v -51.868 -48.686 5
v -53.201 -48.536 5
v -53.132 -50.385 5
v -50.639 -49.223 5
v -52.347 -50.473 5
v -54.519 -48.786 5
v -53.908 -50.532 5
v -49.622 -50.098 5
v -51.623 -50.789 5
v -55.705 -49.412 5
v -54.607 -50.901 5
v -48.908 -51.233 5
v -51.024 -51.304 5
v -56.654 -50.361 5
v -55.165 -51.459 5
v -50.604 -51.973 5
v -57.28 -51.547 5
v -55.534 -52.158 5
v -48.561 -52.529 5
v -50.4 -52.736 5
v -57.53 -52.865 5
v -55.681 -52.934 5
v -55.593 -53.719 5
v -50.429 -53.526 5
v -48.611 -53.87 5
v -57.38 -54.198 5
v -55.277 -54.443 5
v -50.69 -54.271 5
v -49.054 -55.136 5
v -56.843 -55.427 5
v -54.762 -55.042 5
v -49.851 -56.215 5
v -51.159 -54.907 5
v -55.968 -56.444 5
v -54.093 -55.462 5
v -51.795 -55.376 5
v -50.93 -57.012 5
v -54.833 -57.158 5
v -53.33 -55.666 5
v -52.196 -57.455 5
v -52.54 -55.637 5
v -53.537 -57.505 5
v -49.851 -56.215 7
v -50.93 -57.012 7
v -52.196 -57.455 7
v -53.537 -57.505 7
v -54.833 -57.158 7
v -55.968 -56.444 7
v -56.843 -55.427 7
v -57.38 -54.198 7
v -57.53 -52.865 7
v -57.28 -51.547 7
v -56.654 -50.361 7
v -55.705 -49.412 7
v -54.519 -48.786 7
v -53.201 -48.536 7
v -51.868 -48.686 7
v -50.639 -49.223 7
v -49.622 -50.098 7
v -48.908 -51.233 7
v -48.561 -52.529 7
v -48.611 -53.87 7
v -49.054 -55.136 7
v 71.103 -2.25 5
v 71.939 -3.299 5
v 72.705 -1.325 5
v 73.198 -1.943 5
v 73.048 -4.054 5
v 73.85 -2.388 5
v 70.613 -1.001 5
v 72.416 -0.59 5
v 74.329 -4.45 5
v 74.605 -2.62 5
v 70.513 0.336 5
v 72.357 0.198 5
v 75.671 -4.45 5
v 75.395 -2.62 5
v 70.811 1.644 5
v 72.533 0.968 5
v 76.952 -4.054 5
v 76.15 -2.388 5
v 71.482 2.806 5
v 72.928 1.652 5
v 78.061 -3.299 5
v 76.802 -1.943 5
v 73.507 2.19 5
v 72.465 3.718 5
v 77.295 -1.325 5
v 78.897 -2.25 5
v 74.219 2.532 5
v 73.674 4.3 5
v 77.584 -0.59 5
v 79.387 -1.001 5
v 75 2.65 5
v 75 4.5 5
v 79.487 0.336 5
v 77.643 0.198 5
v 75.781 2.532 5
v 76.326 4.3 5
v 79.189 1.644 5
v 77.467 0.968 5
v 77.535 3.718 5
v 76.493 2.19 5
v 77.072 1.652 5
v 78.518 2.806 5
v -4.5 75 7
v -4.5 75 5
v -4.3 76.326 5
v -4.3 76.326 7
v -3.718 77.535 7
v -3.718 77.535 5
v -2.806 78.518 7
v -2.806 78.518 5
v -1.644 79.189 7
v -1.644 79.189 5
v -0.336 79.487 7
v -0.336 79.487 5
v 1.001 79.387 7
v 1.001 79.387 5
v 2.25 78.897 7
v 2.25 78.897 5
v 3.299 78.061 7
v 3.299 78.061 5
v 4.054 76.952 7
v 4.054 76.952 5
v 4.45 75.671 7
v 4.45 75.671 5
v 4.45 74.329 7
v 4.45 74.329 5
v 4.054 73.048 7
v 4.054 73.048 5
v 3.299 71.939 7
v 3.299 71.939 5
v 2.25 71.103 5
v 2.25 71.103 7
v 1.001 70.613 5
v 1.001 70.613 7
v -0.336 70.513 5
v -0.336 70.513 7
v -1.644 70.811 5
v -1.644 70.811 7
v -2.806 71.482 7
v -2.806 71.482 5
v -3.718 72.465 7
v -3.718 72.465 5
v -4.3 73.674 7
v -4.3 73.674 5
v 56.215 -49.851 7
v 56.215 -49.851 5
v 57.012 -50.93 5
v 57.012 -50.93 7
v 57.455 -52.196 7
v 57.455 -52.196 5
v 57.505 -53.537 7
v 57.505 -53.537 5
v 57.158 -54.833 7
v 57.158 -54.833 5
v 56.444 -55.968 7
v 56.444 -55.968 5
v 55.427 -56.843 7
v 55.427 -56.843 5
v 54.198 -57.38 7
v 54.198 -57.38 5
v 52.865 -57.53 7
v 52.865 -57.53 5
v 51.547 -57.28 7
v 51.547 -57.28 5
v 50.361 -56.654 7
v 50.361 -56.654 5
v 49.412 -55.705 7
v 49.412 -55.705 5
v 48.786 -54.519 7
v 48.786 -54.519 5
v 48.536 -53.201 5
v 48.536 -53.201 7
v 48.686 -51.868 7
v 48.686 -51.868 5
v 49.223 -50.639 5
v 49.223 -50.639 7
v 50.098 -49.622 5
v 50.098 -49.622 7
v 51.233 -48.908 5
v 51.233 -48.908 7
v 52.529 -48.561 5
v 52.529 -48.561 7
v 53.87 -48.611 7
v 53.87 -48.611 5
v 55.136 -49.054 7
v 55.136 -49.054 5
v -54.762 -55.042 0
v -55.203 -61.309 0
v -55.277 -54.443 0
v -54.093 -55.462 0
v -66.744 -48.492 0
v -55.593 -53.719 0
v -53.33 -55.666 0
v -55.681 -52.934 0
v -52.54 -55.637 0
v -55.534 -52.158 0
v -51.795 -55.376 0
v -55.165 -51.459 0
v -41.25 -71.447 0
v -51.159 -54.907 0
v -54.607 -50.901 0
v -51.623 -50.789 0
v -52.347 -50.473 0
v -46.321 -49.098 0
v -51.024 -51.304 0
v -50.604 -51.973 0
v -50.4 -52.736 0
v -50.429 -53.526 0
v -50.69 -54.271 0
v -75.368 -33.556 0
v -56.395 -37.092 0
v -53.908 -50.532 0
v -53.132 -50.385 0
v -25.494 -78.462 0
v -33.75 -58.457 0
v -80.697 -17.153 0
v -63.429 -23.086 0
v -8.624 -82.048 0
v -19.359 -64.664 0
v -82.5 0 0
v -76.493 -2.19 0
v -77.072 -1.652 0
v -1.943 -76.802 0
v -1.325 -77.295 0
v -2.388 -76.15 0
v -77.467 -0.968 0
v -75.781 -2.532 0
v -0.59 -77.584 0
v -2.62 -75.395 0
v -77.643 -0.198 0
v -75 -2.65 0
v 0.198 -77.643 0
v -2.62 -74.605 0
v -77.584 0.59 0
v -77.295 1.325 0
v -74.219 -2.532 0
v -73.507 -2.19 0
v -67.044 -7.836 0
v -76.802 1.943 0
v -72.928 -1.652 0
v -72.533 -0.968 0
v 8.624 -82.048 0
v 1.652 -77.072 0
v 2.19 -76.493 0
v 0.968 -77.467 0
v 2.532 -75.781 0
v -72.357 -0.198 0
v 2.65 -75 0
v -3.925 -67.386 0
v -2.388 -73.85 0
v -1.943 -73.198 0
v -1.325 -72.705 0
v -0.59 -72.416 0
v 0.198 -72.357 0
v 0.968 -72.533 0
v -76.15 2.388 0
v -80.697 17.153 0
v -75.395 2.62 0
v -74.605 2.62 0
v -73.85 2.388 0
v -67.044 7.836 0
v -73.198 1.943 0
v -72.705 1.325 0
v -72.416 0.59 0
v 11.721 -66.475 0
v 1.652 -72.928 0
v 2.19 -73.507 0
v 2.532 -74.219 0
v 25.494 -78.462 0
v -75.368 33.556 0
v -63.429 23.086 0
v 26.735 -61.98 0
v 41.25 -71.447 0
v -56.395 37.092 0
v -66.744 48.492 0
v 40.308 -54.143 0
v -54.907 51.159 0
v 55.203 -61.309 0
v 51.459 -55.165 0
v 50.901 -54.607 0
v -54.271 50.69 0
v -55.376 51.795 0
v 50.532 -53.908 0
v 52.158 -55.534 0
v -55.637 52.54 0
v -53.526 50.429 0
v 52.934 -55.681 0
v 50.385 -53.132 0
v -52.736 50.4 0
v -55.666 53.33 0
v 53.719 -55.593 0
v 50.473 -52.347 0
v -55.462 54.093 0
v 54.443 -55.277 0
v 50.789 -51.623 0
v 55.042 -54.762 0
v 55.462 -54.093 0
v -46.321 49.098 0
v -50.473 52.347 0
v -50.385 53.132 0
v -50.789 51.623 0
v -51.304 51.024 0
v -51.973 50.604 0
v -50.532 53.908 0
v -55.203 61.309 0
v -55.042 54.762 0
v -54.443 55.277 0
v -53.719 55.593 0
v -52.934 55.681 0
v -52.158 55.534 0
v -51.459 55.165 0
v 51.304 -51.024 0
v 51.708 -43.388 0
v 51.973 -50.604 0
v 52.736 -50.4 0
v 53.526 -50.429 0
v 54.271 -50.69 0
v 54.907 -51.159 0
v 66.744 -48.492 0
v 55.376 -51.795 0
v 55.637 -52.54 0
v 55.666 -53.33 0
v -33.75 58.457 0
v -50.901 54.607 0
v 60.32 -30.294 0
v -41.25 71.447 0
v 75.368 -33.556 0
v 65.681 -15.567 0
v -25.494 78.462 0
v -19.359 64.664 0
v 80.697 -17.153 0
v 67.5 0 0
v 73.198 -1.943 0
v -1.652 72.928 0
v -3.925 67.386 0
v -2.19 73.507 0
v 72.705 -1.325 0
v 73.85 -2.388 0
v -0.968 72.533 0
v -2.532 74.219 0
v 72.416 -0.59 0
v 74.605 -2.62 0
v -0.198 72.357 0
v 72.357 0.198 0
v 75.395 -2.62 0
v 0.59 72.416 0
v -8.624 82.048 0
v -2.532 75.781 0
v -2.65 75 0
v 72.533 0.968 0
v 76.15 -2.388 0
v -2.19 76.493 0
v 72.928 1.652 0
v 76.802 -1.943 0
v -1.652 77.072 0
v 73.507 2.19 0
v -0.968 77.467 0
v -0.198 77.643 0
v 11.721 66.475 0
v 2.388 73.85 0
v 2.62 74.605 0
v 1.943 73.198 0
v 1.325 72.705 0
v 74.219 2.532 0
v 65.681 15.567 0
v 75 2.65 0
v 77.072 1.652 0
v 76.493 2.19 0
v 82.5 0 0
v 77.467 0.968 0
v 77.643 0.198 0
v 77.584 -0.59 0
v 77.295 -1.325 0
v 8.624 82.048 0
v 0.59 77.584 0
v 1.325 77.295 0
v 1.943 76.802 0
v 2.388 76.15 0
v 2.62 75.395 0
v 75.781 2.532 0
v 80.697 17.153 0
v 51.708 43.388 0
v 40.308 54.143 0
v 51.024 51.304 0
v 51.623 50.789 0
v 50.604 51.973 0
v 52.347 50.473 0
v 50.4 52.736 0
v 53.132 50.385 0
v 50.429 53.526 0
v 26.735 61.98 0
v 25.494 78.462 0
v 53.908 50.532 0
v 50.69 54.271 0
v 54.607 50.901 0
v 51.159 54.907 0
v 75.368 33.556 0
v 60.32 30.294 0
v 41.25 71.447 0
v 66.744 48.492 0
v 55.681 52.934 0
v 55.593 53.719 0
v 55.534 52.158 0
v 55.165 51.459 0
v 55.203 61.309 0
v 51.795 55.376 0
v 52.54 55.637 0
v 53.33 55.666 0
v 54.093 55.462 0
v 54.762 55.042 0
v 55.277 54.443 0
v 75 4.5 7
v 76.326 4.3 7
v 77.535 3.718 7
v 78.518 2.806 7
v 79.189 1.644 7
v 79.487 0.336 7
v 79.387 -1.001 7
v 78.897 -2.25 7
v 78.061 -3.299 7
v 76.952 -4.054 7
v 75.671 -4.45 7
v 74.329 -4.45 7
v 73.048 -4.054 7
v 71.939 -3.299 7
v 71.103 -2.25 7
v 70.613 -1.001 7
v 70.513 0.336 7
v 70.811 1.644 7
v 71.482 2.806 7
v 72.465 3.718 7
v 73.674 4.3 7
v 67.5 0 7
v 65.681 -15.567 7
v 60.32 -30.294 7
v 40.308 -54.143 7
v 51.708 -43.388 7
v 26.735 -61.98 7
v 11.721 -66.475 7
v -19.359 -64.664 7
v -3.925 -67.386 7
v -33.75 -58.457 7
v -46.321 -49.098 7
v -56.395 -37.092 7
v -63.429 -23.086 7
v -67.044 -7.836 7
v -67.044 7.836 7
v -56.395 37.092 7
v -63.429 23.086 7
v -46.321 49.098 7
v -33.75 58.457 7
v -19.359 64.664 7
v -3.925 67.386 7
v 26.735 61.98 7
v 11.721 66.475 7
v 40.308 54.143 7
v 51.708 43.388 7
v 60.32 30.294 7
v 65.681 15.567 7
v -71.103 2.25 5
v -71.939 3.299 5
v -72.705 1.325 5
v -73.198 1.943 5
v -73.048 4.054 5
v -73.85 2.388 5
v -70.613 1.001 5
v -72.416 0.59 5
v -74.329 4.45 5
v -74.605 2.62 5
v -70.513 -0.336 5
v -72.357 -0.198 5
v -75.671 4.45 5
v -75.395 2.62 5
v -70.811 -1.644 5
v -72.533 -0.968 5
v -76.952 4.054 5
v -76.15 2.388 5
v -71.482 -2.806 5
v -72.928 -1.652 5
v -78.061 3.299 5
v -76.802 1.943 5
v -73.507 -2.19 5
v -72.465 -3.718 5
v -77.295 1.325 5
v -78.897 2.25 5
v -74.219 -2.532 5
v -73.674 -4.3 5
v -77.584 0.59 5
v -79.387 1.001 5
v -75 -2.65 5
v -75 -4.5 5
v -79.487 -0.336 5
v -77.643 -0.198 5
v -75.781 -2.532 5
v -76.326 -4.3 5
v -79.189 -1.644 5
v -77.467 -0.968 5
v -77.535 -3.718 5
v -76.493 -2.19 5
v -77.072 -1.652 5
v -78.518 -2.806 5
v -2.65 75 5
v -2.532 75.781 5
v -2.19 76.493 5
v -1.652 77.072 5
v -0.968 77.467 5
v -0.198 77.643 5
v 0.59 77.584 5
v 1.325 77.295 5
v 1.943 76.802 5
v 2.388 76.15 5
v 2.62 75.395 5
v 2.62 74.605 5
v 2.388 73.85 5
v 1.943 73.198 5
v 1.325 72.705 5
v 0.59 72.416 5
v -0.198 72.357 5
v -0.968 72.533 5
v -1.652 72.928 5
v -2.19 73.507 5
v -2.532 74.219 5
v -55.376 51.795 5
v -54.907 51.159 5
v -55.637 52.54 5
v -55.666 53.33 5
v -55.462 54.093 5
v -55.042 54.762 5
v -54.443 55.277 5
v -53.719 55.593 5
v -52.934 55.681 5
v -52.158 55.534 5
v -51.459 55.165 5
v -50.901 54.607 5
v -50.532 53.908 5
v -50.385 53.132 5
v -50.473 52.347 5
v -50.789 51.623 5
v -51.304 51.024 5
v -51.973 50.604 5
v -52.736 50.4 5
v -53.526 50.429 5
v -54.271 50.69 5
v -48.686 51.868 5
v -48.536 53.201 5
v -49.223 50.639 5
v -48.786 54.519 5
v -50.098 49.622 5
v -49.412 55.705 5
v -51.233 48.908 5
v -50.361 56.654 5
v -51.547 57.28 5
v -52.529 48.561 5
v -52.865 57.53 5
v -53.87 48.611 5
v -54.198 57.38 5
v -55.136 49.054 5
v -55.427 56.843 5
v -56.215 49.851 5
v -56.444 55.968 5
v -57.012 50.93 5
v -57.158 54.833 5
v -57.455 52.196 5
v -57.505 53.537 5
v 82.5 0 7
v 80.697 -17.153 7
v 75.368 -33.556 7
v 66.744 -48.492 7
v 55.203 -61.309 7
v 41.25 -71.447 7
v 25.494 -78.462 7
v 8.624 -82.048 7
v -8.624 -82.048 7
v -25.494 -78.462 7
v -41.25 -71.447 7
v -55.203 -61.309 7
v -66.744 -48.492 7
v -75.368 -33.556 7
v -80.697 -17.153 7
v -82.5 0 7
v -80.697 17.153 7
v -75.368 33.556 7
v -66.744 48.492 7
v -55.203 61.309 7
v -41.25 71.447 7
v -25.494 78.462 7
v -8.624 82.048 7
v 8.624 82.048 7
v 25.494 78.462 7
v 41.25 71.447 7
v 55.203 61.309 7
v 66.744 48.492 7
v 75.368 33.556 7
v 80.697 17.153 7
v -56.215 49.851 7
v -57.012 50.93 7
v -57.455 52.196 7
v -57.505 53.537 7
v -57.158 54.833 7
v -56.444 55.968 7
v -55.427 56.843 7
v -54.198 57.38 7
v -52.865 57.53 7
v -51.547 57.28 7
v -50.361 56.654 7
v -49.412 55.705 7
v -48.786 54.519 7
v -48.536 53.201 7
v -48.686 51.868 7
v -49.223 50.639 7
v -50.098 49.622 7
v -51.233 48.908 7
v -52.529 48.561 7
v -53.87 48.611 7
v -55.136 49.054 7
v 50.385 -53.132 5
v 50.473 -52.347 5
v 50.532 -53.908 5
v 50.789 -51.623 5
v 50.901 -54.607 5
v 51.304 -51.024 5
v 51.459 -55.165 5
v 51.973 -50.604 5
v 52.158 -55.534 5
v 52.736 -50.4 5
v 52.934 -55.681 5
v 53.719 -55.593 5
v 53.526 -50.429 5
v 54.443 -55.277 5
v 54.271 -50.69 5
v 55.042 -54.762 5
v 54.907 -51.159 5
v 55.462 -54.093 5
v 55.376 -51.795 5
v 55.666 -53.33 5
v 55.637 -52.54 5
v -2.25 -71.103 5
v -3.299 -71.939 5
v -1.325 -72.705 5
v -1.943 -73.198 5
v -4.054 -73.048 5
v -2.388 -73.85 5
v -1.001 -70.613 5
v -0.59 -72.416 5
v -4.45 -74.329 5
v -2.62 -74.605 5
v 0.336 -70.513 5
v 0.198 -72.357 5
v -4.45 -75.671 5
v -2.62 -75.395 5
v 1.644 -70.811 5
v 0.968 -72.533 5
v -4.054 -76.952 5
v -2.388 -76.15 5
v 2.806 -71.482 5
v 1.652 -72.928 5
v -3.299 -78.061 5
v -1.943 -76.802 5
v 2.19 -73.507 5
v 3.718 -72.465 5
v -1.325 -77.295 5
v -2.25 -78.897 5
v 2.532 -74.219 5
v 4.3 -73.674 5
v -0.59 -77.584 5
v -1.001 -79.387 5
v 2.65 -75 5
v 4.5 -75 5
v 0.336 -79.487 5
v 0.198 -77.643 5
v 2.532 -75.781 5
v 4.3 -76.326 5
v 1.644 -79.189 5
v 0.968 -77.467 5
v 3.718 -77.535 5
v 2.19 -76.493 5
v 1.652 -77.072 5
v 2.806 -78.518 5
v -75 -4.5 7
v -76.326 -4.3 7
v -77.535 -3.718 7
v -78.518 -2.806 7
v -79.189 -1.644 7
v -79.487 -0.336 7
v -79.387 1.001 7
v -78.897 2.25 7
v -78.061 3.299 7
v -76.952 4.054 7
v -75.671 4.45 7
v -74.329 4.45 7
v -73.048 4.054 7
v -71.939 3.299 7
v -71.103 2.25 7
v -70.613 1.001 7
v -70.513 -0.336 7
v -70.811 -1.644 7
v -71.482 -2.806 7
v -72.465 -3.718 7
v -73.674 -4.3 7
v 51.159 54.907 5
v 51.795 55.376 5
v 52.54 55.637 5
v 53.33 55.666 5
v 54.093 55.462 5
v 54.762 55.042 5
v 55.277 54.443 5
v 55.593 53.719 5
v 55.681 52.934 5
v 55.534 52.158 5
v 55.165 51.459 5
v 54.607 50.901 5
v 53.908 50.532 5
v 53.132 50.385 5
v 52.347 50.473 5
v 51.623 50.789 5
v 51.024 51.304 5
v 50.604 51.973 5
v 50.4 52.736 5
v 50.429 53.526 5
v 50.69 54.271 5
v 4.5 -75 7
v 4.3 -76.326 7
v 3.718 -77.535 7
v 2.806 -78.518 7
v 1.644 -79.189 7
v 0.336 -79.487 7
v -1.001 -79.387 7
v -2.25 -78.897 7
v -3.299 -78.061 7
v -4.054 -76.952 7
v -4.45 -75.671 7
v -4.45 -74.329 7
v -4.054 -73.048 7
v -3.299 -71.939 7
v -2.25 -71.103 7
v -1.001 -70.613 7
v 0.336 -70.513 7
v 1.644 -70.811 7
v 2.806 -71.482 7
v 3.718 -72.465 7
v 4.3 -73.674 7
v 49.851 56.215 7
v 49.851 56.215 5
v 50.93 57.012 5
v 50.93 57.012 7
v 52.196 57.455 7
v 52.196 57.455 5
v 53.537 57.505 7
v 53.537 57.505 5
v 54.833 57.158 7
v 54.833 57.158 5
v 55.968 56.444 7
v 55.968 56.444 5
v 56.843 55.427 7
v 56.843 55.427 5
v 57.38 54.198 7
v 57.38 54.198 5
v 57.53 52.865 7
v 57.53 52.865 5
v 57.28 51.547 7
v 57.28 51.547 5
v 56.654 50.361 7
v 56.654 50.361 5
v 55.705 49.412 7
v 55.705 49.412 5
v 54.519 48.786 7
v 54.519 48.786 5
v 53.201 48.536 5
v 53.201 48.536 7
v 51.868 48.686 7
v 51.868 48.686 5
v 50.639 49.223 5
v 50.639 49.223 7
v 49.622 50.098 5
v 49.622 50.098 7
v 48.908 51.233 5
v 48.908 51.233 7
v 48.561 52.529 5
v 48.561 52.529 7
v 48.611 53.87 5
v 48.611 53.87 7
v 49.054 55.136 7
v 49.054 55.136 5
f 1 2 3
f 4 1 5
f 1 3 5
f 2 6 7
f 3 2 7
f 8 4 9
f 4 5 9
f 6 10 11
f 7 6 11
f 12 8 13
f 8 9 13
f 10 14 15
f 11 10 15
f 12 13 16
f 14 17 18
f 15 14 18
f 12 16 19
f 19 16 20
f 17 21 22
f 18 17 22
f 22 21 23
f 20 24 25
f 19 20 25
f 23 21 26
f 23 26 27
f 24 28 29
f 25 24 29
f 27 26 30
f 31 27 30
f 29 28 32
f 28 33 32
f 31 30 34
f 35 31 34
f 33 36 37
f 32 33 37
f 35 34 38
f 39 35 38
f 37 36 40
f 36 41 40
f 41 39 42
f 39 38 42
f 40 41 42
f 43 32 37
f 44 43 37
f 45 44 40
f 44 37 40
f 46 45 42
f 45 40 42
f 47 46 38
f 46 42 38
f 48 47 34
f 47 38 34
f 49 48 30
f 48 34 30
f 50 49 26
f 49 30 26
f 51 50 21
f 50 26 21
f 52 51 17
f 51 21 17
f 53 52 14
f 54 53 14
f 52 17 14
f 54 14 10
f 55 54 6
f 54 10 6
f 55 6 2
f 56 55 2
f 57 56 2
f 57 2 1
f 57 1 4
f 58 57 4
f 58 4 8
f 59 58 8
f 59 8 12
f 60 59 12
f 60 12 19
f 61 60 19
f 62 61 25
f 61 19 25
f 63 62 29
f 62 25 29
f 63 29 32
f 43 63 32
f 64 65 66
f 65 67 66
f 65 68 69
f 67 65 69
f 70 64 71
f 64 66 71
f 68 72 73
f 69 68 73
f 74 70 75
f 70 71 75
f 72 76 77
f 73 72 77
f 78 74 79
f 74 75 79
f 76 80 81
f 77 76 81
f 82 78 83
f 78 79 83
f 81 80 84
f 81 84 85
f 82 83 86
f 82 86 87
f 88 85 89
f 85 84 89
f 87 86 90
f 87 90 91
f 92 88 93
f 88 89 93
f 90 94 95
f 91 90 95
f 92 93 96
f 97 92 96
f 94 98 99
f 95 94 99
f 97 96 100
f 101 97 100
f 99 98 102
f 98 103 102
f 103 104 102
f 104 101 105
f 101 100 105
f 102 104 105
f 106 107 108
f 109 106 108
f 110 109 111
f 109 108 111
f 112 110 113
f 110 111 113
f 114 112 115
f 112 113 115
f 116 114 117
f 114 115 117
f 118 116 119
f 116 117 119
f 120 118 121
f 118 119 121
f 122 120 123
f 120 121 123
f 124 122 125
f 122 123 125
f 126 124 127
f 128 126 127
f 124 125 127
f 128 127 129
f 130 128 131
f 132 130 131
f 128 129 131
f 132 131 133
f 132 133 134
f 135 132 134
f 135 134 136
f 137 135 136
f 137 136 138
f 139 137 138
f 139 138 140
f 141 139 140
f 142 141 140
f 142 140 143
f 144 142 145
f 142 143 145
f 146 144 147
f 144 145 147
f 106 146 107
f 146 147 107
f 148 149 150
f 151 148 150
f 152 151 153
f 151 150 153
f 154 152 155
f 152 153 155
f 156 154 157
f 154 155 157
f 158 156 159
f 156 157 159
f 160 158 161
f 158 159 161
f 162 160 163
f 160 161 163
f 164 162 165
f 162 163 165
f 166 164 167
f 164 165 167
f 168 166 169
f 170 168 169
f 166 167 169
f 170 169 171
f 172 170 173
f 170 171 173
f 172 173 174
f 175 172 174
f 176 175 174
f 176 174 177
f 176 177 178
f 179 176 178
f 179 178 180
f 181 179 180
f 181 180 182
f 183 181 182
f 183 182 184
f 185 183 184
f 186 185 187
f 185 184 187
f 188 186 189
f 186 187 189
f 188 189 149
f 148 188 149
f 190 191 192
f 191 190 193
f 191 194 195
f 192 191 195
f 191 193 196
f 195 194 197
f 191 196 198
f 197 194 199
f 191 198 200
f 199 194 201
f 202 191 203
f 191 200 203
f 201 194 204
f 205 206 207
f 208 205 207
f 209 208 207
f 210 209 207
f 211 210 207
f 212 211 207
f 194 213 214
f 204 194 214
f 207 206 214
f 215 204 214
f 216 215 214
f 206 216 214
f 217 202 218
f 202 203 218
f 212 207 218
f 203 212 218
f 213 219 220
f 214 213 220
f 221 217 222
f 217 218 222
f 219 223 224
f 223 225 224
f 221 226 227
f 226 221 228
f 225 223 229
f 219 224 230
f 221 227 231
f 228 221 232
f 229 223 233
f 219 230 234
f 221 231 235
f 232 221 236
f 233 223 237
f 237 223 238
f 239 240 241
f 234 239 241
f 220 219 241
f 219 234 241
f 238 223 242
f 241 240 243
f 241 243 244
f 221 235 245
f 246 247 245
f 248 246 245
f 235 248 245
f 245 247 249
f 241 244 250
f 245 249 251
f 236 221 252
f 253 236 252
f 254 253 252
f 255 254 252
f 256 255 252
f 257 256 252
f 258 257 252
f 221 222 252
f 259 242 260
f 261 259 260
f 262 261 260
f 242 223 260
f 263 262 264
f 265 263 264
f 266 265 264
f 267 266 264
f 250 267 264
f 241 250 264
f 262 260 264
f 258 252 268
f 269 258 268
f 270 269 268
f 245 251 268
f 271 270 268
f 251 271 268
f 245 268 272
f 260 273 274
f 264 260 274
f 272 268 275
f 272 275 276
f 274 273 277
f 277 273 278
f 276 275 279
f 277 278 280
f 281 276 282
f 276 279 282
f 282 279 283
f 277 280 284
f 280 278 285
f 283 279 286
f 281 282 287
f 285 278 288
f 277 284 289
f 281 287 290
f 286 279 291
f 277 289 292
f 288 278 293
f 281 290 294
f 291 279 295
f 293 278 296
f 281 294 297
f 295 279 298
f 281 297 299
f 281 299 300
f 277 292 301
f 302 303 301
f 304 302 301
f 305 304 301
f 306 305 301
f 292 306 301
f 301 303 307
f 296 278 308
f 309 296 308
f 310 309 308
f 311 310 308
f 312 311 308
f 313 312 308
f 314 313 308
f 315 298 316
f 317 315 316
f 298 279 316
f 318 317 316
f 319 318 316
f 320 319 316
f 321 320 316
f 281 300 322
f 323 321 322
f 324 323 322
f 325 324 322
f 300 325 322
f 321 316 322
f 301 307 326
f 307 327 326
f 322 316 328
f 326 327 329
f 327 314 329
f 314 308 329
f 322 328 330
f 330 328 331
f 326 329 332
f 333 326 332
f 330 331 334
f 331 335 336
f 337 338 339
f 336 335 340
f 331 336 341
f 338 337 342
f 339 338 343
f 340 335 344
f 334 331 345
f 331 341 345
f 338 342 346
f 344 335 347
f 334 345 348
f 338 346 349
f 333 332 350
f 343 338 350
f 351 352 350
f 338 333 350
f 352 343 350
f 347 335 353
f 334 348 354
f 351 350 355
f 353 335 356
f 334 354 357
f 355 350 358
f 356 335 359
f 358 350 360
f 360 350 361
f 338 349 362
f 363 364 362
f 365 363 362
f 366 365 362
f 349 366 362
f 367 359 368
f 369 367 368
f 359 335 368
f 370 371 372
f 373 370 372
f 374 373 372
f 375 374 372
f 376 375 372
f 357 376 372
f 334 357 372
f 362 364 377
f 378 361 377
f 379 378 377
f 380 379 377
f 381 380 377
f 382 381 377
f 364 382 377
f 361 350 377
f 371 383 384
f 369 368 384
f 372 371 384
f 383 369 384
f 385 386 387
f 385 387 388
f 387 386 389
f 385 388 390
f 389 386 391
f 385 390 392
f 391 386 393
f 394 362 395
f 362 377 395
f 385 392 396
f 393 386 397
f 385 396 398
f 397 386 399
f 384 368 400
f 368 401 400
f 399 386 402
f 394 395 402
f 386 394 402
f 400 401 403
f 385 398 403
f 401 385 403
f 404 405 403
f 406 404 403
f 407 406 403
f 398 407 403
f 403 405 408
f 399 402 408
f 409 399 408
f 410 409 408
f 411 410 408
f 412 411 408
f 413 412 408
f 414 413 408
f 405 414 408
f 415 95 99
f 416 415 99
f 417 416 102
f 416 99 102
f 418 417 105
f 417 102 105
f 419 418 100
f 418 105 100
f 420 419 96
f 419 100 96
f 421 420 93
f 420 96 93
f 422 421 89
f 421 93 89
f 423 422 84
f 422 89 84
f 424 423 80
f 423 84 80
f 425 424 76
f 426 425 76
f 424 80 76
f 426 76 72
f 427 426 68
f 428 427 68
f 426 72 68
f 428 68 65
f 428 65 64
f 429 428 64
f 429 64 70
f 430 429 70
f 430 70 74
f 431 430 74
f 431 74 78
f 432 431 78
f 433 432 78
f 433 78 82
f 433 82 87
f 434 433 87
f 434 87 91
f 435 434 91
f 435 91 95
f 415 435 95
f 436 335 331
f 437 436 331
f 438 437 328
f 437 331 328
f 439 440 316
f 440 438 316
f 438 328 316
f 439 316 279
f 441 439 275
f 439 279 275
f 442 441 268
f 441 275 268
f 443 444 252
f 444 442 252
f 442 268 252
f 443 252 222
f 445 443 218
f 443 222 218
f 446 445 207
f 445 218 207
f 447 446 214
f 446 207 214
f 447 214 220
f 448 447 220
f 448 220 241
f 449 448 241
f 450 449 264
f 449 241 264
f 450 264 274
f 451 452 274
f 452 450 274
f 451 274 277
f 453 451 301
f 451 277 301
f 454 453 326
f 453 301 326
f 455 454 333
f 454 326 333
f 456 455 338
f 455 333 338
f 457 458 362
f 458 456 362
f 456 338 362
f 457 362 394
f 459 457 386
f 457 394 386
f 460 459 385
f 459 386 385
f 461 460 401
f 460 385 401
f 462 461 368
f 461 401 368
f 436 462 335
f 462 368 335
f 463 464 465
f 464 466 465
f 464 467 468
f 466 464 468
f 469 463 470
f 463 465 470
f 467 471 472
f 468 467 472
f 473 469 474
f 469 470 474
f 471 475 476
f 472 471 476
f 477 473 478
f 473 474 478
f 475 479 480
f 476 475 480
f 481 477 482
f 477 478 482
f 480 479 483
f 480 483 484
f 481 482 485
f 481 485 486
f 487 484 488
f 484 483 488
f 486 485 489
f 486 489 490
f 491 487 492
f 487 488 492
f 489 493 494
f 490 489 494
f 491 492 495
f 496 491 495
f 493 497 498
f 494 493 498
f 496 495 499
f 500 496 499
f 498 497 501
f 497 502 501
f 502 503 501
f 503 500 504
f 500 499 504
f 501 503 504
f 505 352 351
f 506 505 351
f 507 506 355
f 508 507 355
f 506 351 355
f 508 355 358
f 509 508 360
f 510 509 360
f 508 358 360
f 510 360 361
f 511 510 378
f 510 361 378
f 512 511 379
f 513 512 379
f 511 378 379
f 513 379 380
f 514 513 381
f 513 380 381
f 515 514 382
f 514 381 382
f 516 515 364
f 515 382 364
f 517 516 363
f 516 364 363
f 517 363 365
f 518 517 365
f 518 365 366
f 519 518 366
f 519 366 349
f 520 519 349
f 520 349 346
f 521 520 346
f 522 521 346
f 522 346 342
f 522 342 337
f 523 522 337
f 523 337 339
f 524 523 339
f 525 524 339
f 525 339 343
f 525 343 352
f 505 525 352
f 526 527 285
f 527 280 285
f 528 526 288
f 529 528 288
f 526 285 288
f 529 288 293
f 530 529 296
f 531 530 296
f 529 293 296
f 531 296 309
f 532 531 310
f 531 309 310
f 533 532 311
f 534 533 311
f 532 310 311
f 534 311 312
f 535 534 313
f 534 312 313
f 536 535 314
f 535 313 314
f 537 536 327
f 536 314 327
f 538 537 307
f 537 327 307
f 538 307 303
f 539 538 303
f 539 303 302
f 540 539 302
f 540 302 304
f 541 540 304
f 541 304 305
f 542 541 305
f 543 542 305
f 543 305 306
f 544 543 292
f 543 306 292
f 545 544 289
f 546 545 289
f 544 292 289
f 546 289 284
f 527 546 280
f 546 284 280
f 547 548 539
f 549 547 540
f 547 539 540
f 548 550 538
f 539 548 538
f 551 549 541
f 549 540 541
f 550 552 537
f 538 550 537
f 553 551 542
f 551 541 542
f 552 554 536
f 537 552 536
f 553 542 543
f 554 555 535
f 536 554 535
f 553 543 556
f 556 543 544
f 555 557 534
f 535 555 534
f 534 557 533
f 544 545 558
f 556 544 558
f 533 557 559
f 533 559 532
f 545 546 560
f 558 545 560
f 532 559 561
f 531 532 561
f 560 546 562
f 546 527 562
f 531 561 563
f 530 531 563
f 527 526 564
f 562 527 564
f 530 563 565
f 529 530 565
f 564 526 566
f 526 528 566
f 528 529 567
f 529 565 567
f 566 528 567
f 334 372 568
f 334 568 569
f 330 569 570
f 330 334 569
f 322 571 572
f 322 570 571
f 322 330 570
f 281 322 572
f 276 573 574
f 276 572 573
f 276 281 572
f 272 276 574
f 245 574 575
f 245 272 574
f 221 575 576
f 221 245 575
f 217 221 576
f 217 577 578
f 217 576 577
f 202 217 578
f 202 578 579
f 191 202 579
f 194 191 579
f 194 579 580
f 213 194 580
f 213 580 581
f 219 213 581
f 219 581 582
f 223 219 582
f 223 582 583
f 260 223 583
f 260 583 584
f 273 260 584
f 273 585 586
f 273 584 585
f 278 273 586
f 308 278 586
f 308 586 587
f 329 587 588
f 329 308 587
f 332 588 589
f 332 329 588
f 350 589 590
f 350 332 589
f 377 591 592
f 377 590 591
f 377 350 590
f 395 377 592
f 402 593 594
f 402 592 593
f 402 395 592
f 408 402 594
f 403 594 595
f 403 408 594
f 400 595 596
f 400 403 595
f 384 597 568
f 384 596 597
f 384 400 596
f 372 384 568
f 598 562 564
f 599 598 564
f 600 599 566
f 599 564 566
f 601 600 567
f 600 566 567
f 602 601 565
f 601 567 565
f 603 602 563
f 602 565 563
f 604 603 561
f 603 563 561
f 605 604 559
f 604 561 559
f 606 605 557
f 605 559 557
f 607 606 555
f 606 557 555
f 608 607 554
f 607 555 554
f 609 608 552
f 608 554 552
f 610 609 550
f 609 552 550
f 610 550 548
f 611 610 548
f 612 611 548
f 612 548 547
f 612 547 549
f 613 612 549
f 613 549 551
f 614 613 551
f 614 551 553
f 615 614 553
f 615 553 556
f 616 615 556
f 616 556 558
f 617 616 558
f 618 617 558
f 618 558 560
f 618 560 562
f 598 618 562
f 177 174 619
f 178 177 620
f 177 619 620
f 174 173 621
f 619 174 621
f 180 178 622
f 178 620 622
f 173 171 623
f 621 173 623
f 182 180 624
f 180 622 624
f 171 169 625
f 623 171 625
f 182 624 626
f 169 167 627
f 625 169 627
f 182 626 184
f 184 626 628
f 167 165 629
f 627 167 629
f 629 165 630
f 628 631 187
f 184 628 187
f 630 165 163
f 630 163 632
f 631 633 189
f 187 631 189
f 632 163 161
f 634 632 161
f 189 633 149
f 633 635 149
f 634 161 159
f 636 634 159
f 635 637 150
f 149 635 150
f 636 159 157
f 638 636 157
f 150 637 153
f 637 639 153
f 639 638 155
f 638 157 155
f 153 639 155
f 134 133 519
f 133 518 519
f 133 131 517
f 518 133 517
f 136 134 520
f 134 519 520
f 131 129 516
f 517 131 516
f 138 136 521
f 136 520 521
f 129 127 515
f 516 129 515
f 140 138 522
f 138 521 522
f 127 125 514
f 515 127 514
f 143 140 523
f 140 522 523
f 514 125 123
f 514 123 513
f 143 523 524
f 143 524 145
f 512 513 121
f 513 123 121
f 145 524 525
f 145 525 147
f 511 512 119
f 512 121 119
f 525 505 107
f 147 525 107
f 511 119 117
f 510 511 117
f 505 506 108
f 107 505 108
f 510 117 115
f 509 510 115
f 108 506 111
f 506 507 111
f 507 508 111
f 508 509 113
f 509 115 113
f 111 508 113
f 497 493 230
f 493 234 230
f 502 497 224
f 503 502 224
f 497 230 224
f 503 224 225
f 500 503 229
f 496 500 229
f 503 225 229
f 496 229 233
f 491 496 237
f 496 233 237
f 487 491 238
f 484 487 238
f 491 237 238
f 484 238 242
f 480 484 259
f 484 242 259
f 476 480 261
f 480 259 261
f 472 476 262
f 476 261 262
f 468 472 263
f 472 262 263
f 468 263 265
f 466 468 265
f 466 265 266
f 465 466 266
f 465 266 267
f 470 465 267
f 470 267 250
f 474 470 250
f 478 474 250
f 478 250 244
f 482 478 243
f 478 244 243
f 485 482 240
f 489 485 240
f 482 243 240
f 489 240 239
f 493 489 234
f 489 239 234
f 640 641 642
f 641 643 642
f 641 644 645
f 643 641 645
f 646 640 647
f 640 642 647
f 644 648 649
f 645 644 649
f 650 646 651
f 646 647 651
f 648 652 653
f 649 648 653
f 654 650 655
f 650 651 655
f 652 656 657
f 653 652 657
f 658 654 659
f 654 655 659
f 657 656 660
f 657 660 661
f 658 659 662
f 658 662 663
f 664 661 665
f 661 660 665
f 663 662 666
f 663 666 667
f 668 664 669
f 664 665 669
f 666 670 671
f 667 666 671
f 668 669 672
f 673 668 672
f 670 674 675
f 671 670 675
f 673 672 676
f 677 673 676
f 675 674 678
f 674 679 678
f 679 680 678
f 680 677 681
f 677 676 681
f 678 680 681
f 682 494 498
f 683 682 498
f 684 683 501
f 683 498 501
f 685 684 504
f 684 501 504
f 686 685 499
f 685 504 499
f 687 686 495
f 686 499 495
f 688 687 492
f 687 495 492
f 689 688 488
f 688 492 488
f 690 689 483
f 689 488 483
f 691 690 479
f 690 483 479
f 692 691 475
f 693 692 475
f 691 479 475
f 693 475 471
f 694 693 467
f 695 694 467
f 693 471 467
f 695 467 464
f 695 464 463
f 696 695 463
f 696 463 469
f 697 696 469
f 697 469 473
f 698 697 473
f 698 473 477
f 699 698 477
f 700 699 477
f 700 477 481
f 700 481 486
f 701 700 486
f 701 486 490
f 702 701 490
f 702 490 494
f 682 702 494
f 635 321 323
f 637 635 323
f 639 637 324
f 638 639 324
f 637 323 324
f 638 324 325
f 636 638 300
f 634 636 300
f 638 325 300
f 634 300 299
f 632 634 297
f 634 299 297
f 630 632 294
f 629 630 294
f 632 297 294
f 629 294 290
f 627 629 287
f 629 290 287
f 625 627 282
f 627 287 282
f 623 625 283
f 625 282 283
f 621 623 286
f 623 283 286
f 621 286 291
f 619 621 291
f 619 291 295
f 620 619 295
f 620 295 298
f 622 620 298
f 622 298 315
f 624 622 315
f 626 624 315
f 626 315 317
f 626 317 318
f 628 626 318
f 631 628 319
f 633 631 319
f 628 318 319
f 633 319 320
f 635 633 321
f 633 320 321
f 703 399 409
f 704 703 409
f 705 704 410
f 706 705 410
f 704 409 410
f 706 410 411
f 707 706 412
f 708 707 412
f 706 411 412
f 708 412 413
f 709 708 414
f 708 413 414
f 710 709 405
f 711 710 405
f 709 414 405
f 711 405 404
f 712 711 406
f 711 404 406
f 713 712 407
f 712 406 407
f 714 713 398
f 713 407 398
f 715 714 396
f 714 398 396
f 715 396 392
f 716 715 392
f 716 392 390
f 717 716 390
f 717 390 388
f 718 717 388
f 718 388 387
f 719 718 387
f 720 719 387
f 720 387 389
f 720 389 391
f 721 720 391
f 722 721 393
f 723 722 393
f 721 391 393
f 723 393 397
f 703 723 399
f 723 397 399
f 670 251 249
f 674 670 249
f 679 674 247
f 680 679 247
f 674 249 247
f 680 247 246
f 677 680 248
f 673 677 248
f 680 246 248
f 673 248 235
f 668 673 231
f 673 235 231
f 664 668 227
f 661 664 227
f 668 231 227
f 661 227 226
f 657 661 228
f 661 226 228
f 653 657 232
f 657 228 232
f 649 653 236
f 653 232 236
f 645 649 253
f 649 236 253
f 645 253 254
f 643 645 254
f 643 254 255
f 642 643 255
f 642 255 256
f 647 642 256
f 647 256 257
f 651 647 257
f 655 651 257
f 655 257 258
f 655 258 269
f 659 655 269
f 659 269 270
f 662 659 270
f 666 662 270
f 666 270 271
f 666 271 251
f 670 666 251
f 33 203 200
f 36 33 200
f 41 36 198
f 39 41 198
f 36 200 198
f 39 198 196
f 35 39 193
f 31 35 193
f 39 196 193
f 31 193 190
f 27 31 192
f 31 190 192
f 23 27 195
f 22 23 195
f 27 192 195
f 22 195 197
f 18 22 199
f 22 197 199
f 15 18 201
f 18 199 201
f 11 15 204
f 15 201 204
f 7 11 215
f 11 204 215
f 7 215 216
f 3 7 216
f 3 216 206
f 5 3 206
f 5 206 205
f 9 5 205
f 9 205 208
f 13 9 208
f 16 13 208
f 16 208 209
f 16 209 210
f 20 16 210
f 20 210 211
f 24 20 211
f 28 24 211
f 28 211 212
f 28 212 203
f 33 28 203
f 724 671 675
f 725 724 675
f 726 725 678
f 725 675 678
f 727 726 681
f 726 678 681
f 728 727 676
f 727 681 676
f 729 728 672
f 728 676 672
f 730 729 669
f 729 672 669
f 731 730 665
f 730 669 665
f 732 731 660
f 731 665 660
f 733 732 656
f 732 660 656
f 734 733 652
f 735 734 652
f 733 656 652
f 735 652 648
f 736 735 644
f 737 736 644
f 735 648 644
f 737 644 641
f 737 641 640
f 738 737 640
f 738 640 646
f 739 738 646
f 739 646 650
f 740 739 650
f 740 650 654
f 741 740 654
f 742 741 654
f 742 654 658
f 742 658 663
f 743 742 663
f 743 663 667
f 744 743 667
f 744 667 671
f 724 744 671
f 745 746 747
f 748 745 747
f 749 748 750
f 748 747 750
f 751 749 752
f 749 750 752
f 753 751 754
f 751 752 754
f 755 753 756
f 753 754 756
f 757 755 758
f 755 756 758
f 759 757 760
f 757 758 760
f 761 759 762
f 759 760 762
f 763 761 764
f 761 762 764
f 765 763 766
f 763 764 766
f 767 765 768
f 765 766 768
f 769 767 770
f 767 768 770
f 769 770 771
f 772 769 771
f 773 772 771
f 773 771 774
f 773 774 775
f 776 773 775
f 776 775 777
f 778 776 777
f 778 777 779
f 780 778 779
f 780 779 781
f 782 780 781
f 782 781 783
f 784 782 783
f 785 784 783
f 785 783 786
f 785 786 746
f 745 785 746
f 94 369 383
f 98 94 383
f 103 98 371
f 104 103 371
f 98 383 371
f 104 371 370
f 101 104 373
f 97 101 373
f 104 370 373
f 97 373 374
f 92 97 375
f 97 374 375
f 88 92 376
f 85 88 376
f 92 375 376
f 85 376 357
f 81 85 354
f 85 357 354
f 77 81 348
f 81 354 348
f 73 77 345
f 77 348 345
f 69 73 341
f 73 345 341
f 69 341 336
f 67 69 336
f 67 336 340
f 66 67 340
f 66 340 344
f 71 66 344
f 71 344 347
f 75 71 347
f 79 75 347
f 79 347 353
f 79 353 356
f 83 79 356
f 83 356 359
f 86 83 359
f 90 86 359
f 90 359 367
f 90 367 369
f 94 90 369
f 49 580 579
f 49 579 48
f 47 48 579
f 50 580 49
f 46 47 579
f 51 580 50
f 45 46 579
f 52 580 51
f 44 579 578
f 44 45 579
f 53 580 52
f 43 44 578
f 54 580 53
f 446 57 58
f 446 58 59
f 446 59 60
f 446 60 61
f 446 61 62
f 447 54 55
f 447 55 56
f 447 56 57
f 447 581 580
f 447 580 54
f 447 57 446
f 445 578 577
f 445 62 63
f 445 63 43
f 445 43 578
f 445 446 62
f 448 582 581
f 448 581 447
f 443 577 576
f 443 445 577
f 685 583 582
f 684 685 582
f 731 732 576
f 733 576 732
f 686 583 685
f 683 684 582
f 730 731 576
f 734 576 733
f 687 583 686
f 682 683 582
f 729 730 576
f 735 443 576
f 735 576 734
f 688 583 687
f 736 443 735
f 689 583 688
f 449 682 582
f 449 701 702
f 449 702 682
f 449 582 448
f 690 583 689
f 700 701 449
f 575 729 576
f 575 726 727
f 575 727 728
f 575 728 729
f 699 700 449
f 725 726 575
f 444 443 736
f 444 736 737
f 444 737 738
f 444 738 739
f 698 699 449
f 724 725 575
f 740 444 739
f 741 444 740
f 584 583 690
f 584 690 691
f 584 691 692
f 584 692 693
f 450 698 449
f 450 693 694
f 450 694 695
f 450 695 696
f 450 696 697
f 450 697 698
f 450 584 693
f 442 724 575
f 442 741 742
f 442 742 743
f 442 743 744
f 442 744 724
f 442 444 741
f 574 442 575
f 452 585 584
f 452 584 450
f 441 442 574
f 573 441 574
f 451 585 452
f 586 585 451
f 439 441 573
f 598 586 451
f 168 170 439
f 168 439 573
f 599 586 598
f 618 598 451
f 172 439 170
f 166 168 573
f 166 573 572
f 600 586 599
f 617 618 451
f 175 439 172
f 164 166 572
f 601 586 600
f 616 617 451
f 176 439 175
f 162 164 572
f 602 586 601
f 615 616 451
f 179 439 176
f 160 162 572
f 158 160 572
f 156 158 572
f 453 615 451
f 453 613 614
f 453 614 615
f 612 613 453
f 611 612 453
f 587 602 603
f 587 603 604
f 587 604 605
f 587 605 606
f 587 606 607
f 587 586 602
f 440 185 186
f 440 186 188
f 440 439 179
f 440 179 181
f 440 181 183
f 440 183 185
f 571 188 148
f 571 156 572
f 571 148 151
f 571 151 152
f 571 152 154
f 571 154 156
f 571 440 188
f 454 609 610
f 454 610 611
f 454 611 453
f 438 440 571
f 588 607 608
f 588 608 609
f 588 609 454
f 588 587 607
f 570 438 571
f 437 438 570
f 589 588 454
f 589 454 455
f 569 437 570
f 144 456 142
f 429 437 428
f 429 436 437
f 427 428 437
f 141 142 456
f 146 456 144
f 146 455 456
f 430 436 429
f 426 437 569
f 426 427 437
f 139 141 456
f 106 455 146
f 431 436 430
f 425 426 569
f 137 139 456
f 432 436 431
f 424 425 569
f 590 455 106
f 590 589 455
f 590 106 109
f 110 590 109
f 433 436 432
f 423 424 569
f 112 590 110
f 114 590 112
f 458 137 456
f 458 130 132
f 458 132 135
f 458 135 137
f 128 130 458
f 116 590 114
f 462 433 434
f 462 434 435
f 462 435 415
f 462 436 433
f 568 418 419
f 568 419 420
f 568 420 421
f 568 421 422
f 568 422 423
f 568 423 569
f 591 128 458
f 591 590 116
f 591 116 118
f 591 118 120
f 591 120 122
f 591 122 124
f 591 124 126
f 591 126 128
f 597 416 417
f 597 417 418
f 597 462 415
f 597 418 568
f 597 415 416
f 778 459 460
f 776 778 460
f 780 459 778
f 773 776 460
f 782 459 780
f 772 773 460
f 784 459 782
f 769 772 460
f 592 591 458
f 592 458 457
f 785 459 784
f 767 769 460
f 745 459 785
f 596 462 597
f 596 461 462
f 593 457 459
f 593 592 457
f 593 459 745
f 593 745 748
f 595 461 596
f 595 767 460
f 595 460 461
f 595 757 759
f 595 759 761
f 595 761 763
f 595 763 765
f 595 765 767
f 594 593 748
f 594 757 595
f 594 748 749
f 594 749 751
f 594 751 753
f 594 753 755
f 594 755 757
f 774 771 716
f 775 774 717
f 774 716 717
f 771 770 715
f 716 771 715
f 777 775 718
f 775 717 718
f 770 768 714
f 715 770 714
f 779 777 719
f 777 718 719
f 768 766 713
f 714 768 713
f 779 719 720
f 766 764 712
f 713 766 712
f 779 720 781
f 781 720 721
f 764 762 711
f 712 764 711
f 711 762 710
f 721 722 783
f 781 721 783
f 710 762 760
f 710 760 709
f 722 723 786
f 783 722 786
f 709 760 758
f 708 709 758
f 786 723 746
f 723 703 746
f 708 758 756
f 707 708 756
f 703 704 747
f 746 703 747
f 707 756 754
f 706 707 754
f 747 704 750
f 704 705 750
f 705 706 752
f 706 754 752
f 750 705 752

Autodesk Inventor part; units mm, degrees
ref_plane "YZ Plane" through (0, 0, 0) normal (1, 0, 0) x (0, 1, 0)
ref_plane "XZ Plane" through (0, 0, 0) normal (0, 1, 0) x (-1, 0, 0)
ref_plane "XY Plane" through (0, 0, 0) normal (0, 0, 1) x (1, 0, 0)
sketch "Skizze1" plane through (0, 0, 0) normal (0, 0, 1) x (1, 0, 0)
  circle A0 centre (0, 0) radius 67.5
  circle A1 centre (0, 0) radius 82.5
  dimension "d0" = 135
  dimension "d1" = 15
extrude "Extrusion1" add sketch "Skizze1" along normal blind 7
sketch "Skizze2" plane through (0, 0, 7) normal (0, 0, 1) x (1, 0, 0)
  circle A0 centre (0, 0) radius 67.5 projected
  circle A1 centre (0, 0) radius 82.5 projected
  line L0 (0, 0) -> (-82.5, 0) construction
  line L1 (-82.5, 0) -> (-67.5, 0)
  point P0 (-75, 0)
hole "Bohrung1" at (-75, 0, 7) direction (0, 0, -1) diameter 5.3 end through all counterbore diameter 9 counterbore depth 2
pattern_circular "Runde Anordnung1" count 8 over 360 about axis through (0, 0, 0) along (0, 0, 1) of "Bohrung1"
properties part number "_baseBearingMount" material "ABS-Kunststoff"
